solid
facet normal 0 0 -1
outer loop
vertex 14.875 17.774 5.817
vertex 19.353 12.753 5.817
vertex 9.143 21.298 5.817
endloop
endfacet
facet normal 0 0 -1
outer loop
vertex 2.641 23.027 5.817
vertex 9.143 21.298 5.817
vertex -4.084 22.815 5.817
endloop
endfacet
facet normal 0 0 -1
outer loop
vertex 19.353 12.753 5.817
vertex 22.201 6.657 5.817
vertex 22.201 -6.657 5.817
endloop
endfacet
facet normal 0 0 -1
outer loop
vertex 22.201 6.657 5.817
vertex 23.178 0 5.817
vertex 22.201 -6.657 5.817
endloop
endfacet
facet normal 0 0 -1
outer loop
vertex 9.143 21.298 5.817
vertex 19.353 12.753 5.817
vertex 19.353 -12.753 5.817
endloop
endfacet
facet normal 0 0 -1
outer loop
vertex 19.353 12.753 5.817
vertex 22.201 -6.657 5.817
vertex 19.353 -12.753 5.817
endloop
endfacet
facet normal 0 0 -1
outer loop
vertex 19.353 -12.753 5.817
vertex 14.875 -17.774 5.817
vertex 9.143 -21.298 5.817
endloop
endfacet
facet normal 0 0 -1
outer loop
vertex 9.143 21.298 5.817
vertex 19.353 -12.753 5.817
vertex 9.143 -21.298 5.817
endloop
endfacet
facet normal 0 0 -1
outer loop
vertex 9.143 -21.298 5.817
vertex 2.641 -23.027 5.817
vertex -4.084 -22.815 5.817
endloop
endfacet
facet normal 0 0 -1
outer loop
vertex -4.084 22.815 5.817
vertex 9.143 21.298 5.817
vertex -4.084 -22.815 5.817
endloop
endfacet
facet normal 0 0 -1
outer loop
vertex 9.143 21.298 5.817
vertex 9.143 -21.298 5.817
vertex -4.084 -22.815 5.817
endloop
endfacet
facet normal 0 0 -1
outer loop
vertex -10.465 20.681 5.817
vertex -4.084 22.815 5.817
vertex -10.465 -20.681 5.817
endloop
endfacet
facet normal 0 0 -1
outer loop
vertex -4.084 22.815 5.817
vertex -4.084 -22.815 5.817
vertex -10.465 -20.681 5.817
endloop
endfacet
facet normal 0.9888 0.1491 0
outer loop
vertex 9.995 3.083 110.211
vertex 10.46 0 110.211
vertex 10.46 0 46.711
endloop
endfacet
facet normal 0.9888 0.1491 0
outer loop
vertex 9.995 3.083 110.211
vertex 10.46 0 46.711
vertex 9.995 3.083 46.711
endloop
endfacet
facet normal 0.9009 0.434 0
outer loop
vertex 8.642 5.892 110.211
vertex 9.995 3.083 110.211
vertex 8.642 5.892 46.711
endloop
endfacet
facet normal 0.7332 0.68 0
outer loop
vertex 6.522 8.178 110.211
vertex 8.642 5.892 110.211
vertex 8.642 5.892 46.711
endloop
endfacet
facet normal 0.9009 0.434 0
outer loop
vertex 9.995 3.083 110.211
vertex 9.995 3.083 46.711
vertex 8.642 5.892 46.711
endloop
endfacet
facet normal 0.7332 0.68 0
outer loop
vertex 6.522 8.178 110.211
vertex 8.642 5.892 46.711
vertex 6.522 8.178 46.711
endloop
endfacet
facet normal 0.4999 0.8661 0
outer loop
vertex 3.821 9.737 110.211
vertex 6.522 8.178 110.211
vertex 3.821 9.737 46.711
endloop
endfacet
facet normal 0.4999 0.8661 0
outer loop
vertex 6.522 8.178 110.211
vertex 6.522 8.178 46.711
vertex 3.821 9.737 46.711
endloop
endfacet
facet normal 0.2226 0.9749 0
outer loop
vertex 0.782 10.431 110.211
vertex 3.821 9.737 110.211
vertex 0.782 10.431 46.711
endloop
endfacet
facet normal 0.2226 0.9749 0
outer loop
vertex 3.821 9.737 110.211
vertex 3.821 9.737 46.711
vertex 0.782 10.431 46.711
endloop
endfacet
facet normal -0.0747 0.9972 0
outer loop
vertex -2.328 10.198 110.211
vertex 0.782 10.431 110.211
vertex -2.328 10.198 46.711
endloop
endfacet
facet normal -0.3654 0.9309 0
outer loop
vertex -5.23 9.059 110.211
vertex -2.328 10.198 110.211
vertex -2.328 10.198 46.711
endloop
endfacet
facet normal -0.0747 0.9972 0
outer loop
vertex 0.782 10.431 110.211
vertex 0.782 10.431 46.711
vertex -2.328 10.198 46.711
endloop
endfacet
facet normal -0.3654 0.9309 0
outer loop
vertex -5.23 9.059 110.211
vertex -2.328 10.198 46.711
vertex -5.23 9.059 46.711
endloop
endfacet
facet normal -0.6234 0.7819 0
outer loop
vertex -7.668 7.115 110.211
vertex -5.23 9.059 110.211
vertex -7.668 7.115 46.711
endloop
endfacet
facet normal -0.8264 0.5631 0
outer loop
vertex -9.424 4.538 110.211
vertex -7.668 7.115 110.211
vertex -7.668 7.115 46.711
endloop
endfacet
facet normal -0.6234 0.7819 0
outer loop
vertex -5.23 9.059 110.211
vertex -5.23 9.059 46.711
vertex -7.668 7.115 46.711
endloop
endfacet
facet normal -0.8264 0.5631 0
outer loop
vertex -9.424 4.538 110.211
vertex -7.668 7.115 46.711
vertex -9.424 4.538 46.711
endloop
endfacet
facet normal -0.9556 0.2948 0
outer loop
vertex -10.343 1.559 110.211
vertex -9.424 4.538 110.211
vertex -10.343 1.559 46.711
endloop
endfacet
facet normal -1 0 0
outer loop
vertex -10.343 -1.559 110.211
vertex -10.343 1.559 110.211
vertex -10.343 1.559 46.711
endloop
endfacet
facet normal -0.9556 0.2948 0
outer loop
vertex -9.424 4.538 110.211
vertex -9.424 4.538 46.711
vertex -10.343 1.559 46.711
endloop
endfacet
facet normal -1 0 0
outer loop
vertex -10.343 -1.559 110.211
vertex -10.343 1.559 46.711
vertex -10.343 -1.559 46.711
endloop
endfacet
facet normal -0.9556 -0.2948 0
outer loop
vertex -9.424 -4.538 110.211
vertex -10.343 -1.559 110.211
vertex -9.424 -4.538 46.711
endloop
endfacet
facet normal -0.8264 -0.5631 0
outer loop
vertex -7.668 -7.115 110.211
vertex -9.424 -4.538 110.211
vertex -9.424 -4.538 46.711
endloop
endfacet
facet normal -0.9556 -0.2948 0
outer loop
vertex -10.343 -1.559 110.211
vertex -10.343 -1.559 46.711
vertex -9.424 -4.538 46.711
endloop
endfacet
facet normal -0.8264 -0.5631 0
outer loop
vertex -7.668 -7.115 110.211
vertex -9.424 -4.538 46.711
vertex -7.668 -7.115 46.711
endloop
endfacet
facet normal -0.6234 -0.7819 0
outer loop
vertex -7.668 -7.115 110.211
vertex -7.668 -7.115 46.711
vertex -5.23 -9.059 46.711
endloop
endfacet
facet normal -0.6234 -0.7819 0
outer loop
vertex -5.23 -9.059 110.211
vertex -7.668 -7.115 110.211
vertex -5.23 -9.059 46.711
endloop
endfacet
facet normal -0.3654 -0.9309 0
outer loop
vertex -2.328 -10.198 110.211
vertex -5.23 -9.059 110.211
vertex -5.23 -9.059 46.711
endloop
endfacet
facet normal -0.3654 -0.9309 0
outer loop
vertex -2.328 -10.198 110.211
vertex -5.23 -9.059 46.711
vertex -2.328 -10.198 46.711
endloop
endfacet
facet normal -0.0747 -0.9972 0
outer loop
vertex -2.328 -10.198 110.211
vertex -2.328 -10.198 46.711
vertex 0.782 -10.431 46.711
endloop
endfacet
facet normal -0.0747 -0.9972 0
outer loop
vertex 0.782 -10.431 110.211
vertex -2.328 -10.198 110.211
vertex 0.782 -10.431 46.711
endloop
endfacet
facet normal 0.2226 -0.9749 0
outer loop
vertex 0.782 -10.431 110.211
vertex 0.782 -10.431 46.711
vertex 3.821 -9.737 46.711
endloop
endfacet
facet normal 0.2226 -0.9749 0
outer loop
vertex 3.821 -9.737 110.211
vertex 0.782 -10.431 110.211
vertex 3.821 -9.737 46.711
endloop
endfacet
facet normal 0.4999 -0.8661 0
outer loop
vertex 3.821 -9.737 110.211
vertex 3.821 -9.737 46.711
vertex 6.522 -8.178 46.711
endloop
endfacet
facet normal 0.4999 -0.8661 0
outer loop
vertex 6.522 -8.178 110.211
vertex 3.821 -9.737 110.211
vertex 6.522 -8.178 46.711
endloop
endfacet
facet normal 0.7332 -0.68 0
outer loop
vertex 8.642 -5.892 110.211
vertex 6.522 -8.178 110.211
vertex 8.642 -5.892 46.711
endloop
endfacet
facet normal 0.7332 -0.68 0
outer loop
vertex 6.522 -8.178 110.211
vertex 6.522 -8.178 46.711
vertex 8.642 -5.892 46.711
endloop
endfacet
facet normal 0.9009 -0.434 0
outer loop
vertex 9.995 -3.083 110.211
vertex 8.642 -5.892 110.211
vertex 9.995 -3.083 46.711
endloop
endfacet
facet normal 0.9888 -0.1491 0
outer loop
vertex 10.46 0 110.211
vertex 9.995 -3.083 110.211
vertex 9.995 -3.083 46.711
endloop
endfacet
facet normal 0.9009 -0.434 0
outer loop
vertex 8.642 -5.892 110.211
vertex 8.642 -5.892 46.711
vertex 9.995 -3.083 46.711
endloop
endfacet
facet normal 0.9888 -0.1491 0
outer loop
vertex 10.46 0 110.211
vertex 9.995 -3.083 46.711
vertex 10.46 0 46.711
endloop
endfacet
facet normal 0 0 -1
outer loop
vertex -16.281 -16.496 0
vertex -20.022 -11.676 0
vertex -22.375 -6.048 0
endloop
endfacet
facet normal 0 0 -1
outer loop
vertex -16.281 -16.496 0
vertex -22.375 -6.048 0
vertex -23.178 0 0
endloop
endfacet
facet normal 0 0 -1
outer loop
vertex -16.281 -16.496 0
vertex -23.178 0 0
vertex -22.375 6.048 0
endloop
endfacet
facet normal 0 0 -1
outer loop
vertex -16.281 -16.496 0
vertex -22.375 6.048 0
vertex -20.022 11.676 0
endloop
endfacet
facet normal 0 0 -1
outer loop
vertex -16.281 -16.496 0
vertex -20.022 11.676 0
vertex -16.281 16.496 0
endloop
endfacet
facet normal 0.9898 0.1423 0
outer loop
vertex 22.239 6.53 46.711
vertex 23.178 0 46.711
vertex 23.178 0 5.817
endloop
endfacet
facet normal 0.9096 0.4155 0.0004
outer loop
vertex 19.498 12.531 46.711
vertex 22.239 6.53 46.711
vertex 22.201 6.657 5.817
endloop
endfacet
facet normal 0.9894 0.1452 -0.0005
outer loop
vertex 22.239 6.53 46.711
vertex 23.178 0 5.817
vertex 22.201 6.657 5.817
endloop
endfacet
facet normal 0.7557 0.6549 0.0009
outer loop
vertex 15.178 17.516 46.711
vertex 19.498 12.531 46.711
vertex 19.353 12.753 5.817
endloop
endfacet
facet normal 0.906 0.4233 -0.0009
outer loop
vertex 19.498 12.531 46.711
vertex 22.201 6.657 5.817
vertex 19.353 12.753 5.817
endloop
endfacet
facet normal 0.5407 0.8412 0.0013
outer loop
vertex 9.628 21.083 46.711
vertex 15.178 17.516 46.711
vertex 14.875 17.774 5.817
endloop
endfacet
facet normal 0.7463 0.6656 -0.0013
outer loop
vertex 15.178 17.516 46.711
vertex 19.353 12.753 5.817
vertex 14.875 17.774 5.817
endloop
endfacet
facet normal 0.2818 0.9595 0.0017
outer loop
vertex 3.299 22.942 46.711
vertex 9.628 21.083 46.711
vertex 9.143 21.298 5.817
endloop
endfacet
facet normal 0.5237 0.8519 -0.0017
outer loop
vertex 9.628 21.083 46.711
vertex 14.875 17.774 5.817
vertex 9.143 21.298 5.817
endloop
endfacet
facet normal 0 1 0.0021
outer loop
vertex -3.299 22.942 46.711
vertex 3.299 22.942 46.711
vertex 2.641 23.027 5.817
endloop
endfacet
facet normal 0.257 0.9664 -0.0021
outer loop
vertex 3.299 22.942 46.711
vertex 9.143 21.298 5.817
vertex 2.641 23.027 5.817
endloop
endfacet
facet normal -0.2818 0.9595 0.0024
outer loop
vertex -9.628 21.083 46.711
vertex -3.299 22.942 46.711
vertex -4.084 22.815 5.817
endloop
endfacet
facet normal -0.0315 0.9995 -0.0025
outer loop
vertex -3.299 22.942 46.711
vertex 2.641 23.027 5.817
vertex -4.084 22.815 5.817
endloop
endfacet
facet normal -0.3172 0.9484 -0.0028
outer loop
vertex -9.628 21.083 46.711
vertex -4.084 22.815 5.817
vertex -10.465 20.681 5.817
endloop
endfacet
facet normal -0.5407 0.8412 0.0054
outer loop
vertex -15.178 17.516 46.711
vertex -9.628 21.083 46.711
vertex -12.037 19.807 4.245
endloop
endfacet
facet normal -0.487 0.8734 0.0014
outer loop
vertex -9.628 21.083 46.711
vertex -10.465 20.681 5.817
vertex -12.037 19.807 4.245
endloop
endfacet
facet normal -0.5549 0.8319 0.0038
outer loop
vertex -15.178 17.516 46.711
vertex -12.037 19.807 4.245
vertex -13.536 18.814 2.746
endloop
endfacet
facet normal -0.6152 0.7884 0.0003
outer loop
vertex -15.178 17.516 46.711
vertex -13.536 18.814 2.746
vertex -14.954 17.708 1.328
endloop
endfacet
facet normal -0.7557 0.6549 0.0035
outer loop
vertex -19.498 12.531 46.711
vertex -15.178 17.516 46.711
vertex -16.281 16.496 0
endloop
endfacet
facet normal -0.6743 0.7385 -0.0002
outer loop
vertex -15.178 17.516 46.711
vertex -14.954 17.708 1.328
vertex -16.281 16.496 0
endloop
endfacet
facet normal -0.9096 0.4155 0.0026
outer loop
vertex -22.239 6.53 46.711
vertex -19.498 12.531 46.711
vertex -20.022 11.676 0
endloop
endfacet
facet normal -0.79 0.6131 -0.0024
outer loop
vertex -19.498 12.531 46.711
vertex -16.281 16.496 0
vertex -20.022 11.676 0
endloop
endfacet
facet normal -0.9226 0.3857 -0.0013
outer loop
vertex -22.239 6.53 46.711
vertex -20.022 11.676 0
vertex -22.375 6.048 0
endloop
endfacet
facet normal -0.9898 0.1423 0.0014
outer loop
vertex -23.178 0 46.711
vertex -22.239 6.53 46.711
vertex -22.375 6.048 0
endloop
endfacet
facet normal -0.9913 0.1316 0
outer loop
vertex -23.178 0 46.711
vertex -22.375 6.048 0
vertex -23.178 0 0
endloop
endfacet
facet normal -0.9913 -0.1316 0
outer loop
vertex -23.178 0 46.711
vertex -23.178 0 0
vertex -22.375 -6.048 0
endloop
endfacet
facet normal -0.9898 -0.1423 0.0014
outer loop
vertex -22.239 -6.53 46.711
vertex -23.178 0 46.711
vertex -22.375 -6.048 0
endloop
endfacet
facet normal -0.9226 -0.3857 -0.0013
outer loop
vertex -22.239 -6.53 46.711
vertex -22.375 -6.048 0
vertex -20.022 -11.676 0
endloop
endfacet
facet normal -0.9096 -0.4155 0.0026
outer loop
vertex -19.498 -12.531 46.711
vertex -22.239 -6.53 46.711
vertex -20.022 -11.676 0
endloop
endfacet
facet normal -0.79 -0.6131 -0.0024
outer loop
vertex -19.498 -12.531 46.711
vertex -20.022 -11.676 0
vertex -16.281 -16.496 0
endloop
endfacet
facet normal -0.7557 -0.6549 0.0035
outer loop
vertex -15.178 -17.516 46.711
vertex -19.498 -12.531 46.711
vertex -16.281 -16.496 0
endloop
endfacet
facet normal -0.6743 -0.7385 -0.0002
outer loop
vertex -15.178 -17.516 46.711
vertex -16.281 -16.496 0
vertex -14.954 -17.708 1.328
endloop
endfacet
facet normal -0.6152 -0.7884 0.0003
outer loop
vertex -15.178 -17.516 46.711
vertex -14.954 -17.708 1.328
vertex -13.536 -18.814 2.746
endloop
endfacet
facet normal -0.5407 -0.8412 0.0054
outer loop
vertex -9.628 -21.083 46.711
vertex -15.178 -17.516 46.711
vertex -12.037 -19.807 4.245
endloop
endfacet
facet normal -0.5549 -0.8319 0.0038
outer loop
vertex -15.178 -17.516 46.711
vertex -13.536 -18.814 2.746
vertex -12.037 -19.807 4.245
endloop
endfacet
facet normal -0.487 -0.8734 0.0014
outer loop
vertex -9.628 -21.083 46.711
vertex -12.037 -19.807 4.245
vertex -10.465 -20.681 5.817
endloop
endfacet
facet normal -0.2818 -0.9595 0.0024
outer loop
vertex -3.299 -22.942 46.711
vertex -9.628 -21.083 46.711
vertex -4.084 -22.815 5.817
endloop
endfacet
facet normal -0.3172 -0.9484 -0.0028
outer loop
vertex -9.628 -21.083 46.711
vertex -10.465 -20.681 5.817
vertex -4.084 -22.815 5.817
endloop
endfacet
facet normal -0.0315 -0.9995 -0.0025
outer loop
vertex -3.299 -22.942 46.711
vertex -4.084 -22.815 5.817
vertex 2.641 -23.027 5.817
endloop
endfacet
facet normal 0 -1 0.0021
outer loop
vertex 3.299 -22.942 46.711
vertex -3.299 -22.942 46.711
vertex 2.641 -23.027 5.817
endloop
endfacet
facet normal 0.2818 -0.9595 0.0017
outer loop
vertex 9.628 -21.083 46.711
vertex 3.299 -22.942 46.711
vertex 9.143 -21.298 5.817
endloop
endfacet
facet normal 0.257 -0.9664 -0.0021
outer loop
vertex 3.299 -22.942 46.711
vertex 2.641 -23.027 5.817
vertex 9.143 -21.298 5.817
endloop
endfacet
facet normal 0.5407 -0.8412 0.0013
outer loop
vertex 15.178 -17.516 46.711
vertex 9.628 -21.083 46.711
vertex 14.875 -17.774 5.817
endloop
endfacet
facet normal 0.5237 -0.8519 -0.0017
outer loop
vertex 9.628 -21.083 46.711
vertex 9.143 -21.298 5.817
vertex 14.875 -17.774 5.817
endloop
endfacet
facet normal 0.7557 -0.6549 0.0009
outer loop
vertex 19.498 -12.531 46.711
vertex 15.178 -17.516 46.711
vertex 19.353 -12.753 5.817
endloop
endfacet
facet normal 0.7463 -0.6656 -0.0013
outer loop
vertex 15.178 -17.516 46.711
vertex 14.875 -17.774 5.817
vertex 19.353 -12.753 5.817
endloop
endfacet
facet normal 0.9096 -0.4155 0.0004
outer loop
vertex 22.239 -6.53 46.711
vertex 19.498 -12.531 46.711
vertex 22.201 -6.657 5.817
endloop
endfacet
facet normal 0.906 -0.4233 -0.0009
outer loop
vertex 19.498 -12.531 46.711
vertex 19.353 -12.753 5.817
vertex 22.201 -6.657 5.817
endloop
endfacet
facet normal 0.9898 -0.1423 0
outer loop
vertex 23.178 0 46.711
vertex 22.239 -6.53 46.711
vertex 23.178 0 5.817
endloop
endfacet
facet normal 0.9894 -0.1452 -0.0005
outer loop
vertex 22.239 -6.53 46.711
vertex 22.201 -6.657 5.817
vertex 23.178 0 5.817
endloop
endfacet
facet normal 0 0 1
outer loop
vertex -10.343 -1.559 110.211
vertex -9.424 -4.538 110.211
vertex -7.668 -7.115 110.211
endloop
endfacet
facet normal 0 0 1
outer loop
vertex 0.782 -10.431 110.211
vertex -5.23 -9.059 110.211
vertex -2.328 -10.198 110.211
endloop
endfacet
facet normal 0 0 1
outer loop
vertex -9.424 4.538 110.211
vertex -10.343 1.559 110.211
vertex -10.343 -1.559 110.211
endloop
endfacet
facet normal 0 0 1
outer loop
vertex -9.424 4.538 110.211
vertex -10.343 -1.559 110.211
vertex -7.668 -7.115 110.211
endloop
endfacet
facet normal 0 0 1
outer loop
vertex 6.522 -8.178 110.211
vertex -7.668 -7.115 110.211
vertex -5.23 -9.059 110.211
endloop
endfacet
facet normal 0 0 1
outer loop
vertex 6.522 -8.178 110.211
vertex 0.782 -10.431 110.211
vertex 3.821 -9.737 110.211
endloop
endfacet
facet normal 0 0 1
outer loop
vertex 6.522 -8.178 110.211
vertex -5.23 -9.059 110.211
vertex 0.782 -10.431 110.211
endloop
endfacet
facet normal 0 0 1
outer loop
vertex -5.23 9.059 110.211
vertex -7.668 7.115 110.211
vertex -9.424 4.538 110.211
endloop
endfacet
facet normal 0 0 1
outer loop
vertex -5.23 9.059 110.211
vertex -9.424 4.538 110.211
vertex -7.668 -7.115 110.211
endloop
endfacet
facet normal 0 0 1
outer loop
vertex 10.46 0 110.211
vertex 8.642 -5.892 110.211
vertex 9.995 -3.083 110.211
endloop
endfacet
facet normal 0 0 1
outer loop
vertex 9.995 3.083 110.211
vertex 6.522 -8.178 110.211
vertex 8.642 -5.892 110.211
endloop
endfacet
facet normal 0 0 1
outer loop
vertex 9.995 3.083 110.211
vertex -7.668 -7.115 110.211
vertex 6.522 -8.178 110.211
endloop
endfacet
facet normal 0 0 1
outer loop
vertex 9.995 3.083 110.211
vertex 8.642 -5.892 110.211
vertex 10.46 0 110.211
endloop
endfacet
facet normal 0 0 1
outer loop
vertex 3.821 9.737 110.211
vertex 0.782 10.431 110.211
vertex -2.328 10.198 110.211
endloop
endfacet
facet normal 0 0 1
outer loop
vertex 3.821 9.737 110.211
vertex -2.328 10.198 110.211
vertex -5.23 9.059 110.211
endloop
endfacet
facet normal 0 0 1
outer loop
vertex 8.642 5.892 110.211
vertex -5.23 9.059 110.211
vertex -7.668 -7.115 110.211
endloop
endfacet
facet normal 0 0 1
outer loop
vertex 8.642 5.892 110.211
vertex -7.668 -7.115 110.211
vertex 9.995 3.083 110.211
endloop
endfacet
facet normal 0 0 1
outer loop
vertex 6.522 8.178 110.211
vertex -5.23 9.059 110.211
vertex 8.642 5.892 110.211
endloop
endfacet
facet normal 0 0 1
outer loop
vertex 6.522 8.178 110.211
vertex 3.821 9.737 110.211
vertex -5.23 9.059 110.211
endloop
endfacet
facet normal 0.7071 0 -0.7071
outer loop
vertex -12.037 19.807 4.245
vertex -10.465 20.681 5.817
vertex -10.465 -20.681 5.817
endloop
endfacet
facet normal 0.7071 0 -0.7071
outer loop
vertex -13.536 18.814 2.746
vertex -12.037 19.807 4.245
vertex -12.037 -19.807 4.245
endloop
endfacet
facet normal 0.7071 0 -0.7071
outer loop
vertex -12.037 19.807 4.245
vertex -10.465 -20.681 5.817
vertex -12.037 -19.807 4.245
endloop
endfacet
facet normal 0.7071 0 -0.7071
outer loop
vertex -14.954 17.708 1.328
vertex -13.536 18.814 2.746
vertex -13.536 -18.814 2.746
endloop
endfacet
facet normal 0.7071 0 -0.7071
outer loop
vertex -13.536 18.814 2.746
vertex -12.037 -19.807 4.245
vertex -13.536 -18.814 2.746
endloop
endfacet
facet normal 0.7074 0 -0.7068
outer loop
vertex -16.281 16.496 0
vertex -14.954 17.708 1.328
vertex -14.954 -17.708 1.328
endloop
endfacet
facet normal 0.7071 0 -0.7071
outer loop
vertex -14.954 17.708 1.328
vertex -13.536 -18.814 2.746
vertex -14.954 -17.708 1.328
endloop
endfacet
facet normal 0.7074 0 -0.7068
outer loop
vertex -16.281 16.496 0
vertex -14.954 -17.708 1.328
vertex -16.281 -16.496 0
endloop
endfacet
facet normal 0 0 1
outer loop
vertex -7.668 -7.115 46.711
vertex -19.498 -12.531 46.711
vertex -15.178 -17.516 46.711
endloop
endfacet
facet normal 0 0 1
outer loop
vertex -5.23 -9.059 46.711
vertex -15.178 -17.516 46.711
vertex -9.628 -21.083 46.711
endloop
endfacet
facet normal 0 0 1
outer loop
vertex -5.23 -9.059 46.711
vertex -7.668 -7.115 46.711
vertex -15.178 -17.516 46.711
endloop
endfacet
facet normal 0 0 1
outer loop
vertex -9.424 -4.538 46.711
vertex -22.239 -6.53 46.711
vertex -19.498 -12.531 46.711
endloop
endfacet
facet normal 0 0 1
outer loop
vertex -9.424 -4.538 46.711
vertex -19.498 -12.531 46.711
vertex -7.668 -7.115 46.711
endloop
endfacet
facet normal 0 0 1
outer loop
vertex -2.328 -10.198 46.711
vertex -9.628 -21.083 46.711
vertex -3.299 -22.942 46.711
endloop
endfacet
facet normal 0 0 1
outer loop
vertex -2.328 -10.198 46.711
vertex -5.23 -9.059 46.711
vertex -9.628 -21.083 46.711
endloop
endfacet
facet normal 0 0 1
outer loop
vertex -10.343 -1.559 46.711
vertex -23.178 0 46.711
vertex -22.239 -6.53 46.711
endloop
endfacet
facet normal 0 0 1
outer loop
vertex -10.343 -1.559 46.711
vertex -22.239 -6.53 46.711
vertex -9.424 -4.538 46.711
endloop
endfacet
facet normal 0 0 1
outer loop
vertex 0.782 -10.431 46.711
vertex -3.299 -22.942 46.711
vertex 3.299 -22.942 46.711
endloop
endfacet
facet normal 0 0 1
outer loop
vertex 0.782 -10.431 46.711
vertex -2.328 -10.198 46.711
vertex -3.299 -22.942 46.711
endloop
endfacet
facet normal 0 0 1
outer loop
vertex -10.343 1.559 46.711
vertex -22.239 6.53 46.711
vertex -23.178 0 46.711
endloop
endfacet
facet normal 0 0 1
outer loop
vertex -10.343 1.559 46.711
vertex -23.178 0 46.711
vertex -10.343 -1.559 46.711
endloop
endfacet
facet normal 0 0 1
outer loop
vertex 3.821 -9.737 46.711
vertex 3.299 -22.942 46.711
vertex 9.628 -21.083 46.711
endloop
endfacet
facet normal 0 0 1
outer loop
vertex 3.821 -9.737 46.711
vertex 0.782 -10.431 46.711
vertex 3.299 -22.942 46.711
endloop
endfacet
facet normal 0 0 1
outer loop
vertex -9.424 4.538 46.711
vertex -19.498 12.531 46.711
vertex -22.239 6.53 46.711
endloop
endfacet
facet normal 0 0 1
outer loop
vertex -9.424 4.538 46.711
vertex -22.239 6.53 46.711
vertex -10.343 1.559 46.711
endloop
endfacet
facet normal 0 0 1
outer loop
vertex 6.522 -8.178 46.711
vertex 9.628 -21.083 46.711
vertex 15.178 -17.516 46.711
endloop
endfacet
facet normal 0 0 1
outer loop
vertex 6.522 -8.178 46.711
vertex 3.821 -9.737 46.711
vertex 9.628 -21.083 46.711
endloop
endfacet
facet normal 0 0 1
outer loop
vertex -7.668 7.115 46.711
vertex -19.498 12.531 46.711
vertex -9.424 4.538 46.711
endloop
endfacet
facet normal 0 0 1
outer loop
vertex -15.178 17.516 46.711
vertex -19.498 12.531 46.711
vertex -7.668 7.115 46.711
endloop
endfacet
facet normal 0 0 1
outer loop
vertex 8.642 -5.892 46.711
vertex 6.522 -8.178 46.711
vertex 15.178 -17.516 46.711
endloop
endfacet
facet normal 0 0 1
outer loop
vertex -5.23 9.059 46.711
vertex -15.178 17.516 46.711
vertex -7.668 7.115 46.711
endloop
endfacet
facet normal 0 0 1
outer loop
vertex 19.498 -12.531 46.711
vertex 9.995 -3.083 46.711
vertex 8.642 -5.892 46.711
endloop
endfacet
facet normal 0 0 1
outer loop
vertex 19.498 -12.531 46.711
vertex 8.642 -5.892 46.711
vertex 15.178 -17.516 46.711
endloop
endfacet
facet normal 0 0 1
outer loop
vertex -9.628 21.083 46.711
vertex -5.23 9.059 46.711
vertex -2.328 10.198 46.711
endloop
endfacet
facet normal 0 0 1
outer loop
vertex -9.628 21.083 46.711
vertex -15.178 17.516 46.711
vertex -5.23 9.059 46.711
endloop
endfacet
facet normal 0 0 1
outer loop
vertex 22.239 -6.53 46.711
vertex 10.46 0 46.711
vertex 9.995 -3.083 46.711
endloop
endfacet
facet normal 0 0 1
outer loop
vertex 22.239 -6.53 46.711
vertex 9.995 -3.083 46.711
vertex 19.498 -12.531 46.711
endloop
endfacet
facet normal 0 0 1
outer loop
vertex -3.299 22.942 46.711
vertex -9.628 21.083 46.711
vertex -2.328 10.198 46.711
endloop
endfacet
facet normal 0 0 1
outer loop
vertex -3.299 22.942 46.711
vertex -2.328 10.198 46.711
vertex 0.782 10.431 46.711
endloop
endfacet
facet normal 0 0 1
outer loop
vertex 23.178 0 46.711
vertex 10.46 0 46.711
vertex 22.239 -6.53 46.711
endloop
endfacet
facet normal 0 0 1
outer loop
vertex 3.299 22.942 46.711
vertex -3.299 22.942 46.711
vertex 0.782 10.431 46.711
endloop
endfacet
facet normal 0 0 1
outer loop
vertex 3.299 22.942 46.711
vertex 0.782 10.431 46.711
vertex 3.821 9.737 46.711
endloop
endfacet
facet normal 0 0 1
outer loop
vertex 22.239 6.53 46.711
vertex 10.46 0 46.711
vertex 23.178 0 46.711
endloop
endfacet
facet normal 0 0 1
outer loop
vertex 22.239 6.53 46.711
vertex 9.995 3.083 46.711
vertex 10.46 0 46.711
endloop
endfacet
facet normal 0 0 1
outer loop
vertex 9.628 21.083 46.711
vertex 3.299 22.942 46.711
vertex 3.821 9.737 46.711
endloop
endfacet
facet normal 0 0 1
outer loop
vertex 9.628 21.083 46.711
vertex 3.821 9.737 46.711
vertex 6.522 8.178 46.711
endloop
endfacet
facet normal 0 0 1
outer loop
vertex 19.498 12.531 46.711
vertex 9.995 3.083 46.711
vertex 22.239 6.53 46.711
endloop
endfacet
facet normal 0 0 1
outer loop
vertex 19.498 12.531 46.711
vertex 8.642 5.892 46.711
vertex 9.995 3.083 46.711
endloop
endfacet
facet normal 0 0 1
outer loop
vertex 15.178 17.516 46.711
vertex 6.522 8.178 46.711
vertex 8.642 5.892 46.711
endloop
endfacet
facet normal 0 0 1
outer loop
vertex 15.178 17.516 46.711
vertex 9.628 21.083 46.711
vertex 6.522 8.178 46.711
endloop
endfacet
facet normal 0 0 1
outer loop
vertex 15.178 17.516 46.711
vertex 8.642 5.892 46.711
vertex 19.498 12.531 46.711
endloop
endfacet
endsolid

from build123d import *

# Parameters (mm, degrees)
F0_R          = 23.1775
F1_DEPTH      = 46.7106
F2_R          = 10.4599637804
F3_DEPTH      = 63.5
F5_DEPTH      = 23.1785
F5_DEPTH_BACK = 23.1785


with BuildPart() as f1:
    # F0 (on Top) → F1 (new body)
    with BuildSketch(Plane.XY):
        Circle(F0_R)
    extrude(amount=F1_DEPTH)

    # F2 (on face) → F3 (join)
    with BuildSketch(Plane.XY.offset(46.7106)):
        Circle(F2_R)
    extrude(amount=F3_DEPTH)

    # F4 (on Front) → F5 (cut, two sides)
    with BuildSketch(Plane.XZ) as f5_sk:
        Polygon((-10.4648, 5.8166), (-16.2814, 0), (23.1775, 0), (23.1775, 5.8166), align=None)
    extrude(amount=-F5_DEPTH, mode=Mode.SUBTRACT)
    extrude(f5_sk.sketch, amount=F5_DEPTH_BACK, mode=Mode.SUBTRACT)


solid = f1.part
